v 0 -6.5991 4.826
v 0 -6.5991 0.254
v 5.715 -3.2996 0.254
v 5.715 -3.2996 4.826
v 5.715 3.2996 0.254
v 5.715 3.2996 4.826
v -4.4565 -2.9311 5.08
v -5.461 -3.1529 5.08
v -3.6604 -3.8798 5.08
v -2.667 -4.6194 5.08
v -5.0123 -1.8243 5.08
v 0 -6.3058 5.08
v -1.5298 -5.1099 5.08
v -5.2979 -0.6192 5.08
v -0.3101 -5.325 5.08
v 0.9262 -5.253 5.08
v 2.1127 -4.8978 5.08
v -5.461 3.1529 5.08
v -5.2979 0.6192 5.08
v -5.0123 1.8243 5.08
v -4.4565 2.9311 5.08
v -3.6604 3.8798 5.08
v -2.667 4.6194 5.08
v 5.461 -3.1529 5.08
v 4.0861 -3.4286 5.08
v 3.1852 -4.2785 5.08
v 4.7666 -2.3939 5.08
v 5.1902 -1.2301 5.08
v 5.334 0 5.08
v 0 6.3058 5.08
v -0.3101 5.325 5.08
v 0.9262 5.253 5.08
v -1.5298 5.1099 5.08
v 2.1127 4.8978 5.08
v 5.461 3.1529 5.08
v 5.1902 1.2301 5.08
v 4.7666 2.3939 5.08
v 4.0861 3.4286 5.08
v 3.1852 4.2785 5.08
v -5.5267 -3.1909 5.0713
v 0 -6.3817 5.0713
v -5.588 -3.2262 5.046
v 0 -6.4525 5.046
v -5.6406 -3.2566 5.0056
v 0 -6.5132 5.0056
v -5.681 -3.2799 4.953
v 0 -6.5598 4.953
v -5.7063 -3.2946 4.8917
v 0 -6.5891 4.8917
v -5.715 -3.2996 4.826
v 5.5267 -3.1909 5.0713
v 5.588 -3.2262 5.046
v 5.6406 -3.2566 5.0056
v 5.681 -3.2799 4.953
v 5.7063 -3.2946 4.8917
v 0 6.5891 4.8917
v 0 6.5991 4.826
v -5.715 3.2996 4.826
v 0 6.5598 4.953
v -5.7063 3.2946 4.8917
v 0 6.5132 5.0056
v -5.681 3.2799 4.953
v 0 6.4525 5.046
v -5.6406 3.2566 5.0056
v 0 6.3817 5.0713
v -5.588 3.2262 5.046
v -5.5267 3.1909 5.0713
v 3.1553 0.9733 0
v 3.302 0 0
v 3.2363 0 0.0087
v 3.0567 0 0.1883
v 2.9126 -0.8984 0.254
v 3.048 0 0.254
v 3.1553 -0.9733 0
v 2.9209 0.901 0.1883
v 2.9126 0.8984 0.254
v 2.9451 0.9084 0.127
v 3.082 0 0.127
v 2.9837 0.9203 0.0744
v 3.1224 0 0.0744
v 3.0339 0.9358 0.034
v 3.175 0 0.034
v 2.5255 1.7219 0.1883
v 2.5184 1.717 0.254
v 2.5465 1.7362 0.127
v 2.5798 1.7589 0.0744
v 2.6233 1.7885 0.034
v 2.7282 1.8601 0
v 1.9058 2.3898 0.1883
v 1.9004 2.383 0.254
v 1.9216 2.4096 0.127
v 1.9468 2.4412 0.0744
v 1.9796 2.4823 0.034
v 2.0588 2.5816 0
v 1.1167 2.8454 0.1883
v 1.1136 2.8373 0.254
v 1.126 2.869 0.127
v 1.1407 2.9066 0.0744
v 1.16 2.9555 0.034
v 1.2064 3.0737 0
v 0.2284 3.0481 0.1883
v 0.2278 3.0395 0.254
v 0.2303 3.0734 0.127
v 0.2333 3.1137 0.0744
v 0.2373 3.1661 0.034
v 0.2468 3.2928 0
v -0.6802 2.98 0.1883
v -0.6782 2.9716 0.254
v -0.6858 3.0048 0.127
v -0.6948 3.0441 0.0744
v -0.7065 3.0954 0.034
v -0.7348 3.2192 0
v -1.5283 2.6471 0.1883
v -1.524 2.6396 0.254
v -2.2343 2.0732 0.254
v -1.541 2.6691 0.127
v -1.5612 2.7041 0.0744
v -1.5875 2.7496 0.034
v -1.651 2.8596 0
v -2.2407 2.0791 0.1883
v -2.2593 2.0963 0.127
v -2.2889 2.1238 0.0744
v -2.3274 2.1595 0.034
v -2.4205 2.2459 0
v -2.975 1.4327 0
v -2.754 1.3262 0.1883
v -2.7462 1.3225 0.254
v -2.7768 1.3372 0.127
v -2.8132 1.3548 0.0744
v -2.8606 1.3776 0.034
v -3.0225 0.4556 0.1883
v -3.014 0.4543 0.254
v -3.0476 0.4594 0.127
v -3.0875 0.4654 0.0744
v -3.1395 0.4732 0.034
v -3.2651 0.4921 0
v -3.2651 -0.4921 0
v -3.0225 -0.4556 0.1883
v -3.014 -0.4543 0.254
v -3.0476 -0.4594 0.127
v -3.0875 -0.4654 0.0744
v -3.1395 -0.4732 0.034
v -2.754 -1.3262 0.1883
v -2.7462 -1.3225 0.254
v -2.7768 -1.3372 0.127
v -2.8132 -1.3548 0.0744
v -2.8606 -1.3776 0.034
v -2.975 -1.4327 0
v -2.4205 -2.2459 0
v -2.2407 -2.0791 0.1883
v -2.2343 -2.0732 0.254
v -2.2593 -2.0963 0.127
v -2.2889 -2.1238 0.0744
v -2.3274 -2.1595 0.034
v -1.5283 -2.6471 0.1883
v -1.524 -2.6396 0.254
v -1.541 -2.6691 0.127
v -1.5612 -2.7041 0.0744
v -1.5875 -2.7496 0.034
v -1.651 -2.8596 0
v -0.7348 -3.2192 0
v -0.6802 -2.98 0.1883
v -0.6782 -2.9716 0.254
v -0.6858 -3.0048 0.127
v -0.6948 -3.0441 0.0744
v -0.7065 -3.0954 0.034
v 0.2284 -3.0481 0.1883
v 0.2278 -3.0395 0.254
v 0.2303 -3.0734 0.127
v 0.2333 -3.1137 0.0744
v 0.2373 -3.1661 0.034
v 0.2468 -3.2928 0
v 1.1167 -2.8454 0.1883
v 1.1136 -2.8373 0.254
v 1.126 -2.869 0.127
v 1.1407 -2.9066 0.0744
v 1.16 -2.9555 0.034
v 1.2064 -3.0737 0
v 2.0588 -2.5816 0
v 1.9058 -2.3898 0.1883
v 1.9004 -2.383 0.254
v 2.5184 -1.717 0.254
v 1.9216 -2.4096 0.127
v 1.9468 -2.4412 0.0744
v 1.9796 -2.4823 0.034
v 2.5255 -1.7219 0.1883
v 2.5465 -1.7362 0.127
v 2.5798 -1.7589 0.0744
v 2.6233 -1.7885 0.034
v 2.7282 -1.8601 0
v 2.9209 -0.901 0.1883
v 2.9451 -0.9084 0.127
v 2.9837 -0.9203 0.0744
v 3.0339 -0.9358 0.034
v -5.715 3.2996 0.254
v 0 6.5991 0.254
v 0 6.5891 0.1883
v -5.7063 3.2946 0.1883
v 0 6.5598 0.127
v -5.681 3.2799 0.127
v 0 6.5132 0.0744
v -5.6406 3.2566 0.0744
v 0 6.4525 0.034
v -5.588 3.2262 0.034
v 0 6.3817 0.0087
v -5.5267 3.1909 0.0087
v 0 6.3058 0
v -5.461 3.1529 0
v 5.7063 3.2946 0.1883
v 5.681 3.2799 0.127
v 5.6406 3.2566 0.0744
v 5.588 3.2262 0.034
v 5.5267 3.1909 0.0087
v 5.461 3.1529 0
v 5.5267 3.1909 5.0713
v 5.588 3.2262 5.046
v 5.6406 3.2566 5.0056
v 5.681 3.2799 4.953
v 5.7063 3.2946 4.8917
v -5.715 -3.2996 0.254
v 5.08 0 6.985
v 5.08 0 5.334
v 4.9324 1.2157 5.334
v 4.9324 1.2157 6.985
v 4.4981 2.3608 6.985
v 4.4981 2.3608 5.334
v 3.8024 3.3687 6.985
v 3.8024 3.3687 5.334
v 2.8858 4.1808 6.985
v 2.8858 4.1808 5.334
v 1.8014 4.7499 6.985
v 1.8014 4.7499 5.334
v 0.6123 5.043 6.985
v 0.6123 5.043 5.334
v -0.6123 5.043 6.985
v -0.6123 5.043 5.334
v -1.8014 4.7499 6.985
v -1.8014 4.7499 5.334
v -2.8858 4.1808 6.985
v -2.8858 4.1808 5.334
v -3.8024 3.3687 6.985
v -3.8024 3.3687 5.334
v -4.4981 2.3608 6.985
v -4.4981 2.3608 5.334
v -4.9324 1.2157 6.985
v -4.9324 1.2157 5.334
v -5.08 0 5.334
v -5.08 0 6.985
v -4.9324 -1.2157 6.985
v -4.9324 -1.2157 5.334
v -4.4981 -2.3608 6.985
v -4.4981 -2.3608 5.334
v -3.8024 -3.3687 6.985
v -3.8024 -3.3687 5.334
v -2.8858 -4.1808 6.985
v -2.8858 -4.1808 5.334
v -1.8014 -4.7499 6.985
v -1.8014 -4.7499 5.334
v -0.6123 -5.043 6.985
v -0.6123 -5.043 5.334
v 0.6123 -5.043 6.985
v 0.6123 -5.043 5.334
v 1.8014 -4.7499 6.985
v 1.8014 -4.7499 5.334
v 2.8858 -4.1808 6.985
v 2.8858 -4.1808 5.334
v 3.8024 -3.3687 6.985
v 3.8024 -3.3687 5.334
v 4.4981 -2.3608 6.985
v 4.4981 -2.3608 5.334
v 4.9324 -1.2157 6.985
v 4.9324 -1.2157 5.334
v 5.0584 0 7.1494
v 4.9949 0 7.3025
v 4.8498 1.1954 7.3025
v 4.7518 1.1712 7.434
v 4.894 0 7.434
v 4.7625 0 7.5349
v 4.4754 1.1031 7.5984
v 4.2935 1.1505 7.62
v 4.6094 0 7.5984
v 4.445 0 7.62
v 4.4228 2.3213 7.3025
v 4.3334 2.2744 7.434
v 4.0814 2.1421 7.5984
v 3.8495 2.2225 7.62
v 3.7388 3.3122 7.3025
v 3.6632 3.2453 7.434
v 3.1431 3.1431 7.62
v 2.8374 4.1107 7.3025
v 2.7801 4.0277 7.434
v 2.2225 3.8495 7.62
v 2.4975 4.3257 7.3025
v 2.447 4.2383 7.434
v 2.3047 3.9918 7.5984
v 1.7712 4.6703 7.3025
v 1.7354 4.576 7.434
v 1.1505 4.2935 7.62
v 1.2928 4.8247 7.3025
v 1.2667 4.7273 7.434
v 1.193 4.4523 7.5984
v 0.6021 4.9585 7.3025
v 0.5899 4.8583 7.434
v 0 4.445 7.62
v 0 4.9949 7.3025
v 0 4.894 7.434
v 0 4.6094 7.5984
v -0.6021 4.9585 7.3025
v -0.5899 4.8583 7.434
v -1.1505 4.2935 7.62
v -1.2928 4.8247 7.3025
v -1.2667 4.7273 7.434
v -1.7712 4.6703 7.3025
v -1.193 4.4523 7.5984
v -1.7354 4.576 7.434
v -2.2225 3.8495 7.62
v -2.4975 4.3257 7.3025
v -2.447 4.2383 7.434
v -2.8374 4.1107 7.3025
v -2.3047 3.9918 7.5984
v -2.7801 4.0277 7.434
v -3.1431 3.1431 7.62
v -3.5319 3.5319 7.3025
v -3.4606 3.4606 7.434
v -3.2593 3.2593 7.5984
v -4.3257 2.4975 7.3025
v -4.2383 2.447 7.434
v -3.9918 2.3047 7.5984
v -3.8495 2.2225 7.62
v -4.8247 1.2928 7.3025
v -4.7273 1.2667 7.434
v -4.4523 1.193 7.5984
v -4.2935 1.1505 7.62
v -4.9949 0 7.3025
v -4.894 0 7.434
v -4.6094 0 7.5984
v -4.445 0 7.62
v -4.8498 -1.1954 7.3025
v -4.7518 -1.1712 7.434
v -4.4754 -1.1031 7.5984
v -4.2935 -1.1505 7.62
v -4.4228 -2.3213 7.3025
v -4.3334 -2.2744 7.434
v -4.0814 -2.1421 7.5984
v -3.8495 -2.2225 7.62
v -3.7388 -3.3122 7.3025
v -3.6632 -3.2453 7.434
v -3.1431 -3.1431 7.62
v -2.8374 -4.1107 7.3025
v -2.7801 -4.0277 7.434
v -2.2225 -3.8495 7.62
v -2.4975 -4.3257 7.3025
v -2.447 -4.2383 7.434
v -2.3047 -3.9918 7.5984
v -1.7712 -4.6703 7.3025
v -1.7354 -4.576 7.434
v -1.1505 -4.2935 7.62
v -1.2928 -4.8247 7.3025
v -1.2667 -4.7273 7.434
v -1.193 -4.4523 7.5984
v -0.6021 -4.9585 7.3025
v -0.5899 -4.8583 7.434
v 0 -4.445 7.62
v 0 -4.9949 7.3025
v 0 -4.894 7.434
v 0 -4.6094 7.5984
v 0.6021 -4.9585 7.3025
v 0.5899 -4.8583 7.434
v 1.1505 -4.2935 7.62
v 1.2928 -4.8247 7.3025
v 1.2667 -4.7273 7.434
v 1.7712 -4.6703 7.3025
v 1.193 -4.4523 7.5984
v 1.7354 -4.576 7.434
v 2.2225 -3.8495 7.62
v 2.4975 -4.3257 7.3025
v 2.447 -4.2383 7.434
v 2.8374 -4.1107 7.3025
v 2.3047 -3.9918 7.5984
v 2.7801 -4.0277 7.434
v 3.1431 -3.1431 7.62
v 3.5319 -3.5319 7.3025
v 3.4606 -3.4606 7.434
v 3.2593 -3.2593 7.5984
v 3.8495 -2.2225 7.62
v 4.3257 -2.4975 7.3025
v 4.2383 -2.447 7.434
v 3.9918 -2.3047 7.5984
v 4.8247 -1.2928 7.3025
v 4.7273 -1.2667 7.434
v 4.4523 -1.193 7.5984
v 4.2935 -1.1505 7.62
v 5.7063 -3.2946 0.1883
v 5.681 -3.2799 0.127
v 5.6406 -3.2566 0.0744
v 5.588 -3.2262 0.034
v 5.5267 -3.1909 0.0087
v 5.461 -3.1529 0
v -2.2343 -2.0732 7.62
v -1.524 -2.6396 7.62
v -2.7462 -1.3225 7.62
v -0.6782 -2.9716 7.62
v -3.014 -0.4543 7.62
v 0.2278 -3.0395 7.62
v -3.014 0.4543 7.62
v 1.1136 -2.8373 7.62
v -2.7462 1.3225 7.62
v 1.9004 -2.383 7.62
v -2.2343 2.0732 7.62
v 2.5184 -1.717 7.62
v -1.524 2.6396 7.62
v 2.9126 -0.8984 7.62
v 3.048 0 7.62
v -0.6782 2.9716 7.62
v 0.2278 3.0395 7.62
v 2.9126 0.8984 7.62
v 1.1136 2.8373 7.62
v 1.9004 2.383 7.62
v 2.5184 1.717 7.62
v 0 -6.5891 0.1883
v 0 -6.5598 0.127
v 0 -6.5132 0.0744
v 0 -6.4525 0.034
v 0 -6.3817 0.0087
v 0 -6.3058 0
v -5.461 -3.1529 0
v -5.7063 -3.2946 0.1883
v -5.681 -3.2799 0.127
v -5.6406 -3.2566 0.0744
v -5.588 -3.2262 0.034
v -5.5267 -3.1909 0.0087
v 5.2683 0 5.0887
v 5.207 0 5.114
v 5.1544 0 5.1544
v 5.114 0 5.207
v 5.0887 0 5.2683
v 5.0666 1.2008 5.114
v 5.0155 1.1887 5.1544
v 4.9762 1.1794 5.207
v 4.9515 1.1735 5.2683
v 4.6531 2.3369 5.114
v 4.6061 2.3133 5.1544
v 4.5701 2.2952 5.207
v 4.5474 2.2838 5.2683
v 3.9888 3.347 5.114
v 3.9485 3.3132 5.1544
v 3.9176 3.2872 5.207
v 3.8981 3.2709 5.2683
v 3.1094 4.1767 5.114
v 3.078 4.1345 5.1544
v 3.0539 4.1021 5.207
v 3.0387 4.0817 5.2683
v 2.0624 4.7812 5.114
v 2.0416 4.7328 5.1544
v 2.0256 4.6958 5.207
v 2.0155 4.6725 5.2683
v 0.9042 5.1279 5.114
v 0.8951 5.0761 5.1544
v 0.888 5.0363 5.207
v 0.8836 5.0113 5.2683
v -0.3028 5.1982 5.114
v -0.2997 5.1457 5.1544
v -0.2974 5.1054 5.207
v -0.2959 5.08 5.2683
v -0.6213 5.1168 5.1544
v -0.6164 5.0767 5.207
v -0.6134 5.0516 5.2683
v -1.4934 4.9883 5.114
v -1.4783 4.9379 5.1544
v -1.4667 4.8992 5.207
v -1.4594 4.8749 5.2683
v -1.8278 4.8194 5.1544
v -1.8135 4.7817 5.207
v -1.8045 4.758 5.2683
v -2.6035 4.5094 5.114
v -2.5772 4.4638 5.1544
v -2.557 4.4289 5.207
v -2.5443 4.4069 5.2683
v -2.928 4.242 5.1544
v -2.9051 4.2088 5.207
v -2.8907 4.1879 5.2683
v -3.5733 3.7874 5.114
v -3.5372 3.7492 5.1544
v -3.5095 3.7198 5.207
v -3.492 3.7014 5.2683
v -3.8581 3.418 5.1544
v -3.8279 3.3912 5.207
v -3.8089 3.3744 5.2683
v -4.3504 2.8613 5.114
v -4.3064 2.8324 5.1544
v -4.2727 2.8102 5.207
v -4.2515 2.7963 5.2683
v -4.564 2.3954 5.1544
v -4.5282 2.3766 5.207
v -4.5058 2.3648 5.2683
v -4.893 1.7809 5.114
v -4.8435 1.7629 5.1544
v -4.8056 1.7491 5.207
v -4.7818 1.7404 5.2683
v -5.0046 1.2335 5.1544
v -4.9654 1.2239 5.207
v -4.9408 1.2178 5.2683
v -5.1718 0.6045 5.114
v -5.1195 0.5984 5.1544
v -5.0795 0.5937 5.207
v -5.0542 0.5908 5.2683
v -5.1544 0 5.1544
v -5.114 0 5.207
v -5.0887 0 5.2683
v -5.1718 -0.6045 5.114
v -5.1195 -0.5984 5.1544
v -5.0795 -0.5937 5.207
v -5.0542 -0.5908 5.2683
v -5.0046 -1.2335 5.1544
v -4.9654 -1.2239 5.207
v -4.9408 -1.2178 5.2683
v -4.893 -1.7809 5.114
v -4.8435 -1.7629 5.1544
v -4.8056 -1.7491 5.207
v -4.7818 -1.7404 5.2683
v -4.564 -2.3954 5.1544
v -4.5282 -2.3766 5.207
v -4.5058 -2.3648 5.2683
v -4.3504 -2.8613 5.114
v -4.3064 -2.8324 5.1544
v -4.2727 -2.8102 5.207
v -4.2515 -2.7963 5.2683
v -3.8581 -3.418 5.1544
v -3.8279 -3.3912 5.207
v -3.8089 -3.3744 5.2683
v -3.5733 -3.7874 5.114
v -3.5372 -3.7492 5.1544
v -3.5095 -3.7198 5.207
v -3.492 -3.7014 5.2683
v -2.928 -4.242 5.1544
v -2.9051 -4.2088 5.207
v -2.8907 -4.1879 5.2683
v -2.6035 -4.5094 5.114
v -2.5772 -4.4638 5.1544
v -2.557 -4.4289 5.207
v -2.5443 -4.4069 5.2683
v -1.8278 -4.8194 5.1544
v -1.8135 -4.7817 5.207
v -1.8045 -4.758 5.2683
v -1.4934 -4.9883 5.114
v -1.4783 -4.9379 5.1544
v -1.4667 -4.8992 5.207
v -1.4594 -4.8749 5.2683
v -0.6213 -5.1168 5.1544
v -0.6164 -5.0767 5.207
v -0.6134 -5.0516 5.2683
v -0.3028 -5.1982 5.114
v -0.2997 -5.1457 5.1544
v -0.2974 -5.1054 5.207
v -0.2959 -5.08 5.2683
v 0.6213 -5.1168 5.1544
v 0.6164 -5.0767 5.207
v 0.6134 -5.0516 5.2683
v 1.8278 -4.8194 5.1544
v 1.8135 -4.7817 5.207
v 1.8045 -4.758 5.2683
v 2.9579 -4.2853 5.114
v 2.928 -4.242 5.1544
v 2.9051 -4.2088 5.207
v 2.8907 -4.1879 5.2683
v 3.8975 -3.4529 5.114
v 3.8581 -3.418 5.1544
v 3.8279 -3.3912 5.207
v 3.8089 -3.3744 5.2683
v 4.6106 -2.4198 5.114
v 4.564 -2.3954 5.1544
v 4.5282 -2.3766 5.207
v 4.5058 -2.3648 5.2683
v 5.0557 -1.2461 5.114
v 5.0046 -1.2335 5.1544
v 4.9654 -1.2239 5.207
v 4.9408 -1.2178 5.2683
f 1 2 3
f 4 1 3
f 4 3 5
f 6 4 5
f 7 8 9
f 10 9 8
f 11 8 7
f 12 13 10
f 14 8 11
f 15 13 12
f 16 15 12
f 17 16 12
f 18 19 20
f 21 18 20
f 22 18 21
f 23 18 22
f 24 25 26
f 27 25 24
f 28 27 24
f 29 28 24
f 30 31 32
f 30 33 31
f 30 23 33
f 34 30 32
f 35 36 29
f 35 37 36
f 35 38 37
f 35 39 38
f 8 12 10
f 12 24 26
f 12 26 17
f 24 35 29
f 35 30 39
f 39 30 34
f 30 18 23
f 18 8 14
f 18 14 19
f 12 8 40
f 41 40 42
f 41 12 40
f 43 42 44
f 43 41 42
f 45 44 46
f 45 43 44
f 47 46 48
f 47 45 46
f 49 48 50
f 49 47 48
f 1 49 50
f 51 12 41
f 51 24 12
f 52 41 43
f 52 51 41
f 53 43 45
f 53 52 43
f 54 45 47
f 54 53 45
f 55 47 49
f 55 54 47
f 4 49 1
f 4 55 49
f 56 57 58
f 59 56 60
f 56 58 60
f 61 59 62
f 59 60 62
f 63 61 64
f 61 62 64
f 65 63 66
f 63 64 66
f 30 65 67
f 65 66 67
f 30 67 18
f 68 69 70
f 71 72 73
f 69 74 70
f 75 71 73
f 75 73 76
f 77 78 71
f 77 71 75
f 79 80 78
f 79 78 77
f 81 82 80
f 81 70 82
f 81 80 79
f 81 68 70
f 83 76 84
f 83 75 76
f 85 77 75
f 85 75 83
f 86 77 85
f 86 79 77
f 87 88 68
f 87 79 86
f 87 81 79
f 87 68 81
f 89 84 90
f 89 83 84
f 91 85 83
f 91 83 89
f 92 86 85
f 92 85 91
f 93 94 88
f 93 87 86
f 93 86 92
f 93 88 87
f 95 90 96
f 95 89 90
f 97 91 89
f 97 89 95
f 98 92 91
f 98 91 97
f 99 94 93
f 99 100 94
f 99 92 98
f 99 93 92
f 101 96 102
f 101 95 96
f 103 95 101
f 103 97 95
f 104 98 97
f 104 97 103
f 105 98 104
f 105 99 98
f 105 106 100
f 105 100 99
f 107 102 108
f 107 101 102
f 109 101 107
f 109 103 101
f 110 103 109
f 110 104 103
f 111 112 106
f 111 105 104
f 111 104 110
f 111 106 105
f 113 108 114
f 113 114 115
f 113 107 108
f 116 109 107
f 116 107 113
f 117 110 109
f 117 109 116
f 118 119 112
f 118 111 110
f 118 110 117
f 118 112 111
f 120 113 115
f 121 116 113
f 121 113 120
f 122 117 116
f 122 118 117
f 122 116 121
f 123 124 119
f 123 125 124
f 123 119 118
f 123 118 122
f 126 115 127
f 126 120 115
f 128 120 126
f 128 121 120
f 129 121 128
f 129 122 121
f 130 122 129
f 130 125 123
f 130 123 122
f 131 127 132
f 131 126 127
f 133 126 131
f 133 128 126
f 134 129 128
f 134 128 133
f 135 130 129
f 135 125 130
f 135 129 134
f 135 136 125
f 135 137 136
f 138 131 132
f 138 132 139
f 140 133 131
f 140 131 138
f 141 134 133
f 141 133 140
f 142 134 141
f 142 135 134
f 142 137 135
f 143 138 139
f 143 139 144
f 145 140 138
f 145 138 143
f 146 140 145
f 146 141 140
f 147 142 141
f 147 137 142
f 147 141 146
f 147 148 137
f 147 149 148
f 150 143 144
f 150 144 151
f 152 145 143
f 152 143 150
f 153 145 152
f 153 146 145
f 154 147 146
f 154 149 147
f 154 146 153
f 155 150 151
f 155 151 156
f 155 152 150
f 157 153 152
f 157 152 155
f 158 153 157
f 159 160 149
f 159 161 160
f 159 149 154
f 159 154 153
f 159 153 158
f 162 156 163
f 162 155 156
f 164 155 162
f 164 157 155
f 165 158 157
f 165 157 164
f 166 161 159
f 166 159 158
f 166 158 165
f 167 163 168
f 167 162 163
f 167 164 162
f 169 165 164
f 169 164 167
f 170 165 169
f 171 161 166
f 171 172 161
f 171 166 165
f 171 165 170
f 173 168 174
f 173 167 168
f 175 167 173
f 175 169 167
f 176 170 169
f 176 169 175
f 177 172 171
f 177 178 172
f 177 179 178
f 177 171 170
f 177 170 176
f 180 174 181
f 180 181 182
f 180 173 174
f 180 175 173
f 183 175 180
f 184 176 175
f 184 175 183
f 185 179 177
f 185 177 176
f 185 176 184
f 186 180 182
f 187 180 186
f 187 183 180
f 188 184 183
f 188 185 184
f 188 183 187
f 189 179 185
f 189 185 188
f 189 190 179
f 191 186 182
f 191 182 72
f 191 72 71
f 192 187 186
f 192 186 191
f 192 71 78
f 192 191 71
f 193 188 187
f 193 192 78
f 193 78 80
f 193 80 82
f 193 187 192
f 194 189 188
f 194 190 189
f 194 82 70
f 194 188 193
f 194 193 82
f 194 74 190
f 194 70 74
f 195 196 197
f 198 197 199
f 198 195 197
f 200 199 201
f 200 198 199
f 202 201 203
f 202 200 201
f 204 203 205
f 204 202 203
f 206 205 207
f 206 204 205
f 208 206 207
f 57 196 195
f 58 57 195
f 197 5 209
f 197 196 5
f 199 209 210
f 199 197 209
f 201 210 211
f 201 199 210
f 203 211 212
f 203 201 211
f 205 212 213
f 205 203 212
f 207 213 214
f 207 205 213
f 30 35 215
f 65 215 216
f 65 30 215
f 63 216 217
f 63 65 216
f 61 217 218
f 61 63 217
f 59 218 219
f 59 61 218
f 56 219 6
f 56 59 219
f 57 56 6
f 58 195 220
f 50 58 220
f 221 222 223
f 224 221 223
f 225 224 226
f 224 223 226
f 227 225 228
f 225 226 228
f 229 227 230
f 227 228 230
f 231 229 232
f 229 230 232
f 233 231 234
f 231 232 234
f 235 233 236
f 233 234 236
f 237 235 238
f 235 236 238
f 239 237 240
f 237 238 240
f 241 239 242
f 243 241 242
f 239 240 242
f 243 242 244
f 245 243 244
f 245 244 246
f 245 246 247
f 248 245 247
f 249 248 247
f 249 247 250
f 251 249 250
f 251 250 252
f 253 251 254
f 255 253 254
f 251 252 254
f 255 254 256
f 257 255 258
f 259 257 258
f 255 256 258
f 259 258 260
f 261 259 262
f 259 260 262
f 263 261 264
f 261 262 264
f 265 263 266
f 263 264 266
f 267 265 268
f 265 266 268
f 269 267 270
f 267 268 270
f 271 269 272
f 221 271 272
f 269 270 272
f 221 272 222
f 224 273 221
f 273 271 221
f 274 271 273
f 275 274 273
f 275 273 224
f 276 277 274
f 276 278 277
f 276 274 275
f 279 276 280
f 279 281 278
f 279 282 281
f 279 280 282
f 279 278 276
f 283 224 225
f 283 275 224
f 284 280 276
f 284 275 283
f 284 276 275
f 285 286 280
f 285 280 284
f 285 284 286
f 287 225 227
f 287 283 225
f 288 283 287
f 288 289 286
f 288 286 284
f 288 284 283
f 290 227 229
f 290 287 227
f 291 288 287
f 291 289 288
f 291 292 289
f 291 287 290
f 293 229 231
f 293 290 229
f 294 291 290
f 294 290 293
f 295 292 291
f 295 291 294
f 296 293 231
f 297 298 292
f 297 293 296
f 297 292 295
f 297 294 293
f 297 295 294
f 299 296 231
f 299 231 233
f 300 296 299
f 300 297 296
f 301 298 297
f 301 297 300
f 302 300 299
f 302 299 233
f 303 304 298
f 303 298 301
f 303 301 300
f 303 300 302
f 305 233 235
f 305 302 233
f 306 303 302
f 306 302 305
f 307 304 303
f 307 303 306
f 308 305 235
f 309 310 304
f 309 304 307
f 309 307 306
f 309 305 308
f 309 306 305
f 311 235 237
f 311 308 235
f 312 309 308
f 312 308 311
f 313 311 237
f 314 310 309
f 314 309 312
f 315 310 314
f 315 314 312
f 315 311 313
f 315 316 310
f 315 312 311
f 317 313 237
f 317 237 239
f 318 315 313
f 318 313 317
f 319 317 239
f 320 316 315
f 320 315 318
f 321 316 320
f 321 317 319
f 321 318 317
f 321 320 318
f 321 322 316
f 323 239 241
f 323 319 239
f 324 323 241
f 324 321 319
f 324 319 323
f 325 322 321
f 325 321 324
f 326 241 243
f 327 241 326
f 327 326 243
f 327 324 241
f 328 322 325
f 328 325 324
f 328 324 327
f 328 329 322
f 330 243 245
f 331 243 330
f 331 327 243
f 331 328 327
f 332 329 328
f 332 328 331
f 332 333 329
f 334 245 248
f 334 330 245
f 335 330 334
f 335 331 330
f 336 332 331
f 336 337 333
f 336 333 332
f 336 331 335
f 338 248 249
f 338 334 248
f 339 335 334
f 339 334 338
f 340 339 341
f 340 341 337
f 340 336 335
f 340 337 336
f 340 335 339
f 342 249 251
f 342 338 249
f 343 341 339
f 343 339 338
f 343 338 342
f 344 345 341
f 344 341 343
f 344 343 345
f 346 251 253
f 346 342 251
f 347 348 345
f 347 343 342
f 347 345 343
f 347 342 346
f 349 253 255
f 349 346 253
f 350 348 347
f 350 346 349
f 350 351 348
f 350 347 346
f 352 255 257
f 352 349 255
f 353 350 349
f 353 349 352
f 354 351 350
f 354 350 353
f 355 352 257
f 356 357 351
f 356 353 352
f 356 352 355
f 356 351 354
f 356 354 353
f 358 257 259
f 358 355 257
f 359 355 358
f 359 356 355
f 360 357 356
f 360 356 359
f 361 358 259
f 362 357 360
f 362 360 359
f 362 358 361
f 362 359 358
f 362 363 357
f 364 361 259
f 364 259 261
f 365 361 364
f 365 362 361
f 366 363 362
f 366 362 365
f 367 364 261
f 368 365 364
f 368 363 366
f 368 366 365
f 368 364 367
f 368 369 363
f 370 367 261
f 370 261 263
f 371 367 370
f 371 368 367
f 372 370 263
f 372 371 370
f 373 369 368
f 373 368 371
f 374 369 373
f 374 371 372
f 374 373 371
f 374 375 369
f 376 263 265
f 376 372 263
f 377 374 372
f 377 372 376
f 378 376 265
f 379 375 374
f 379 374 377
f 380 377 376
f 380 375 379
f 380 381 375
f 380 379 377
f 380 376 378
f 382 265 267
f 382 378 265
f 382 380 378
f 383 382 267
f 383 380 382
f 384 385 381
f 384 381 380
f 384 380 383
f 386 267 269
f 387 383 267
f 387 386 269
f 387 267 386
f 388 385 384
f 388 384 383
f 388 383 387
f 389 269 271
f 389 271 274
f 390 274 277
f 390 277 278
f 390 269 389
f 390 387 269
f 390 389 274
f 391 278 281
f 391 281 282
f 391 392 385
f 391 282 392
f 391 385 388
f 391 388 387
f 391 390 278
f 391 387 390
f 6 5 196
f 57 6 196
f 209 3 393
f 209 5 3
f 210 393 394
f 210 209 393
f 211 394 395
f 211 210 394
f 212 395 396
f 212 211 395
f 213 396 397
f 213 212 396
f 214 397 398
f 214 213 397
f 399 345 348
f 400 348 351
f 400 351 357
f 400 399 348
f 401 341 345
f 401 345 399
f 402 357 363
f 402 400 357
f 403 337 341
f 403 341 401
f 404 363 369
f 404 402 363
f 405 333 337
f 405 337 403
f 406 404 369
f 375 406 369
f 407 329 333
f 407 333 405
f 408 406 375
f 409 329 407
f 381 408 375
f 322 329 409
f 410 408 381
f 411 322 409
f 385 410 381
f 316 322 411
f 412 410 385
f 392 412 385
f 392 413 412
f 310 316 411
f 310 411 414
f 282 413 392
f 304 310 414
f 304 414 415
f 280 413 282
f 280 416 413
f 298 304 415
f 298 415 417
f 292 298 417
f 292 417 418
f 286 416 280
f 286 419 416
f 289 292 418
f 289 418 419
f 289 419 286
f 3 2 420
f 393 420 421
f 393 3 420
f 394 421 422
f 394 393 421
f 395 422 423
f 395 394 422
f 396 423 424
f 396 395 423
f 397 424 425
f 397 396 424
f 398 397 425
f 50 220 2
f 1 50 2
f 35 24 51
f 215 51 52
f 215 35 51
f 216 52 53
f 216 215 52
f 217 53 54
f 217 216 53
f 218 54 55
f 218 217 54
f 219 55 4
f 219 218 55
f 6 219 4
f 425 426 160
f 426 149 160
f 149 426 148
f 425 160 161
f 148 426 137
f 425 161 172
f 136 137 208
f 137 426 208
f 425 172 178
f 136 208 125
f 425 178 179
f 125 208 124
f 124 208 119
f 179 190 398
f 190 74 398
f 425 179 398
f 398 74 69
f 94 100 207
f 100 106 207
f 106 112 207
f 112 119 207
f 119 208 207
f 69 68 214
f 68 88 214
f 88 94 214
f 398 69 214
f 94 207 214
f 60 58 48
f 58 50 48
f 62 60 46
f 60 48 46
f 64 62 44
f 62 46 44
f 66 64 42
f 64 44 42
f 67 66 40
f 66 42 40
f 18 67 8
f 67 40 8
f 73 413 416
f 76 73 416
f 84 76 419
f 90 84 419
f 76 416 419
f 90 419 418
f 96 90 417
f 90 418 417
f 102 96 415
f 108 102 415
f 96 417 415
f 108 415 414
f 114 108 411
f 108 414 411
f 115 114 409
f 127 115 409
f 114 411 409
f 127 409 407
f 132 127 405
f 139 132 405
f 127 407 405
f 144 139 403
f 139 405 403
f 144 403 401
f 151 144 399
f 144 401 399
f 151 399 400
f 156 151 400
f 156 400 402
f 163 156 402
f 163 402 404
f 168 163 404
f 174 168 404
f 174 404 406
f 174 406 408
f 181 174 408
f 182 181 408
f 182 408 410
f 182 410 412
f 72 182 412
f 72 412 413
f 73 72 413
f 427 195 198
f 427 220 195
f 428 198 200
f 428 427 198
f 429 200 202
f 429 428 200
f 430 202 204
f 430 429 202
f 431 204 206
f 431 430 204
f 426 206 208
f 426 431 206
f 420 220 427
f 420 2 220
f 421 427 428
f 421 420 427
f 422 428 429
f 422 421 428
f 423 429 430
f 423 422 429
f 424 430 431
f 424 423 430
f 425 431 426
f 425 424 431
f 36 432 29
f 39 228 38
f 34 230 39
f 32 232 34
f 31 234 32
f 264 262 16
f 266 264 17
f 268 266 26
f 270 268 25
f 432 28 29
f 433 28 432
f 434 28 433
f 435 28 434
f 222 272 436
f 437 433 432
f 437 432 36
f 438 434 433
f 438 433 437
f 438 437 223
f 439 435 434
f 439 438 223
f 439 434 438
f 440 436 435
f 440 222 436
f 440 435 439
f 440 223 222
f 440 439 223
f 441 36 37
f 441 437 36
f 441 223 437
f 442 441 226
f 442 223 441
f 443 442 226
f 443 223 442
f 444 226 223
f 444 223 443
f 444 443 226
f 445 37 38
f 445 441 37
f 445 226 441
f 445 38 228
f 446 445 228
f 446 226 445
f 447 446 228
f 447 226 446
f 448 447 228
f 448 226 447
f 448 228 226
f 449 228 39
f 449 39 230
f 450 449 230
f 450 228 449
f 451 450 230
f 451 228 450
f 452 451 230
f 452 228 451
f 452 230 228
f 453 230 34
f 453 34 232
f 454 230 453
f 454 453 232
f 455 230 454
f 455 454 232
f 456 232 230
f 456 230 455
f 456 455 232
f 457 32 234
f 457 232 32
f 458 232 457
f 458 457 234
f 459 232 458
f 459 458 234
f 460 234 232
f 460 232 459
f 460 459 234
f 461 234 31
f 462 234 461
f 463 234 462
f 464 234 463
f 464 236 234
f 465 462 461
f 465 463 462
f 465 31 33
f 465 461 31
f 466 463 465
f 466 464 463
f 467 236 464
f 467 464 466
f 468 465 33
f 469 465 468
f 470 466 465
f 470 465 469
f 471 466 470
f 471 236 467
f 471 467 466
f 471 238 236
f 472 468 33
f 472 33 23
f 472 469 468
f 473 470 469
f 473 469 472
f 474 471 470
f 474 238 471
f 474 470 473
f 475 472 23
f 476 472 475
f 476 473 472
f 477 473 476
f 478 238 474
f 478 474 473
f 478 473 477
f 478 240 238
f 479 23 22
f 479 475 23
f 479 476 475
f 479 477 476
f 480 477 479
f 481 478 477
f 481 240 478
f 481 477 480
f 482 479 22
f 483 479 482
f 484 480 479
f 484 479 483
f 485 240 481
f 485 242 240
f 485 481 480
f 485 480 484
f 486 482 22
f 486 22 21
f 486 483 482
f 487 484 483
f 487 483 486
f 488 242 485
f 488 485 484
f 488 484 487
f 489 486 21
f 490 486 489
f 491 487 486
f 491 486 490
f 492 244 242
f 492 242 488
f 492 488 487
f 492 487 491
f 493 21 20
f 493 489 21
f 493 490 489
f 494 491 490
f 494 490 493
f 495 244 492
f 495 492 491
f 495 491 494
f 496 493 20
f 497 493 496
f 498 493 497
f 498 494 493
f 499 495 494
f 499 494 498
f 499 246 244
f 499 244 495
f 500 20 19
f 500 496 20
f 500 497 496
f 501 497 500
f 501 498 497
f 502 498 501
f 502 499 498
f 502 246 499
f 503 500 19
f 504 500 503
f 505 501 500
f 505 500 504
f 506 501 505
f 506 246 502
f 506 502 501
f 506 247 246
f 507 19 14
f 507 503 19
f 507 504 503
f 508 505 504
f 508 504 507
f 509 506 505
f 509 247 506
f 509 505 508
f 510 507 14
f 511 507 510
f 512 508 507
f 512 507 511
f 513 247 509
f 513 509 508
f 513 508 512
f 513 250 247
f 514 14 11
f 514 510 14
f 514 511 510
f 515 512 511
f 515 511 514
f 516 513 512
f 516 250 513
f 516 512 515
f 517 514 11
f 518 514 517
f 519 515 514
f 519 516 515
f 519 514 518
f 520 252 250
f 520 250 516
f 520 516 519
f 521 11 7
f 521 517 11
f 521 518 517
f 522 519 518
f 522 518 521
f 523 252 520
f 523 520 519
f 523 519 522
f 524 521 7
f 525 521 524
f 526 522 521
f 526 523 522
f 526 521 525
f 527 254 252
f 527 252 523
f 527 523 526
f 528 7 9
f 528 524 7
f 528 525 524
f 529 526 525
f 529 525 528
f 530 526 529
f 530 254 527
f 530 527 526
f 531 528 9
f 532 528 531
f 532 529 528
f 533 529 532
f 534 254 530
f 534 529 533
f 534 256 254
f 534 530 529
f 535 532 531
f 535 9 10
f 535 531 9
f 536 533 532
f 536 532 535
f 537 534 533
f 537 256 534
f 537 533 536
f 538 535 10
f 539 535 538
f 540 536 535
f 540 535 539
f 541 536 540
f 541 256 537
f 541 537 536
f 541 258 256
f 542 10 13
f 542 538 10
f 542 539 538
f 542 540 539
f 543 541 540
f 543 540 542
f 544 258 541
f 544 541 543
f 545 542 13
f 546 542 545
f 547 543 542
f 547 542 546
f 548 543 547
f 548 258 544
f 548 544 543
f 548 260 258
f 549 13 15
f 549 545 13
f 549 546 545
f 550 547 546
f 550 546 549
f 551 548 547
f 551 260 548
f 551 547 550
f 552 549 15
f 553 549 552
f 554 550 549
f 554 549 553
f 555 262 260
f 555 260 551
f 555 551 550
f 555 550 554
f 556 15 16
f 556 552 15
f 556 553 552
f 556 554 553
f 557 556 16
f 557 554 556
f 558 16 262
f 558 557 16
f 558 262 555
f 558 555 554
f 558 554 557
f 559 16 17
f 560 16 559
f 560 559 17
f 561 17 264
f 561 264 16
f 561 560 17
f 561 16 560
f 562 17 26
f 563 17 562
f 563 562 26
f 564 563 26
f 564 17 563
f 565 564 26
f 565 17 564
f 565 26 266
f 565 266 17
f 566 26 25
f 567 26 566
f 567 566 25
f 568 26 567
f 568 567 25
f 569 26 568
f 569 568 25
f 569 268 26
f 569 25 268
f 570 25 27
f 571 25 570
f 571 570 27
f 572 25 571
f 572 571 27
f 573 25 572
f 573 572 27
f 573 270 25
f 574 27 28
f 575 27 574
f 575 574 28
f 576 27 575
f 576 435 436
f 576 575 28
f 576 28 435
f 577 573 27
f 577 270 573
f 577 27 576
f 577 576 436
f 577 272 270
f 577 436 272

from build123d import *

# Parameters (mm, degrees)
BOSS_EXTRUDE1_DEPTH = 5.08
SKETCH3_R           = 5.08
BOSS_EXTRUDE3_DEPTH = 2.54
FILLET1_R           = 0.635
SKETCH4_R           = 3.048
CUT_EXTRUDE1_DEPTH  = 12.58766262
FILLET2_R           = 0.254
FILLET3_R           = 0.254


with BuildPart() as part:
    # Sketch1 → Boss-Extrude1 (new body)
    with BuildSketch(Plane.XY):
        Polygon((-5.715, 3.299556788), (-5.715, -3.299556788), (0, -6.599113577), (5.715, -3.299556788), (5.715, 3.299556788), (0, 6.599113577), align=None)
    extrude(amount=BOSS_EXTRUDE1_DEPTH)

    # Sketch3 → Boss-Extrude3 (add)
    with BuildSketch(Plane.XY.offset(5.08)):
        Circle(SKETCH3_R)
    extrude(amount=BOSS_EXTRUDE3_DEPTH)

    # Fillet1
    fillet1_edges = [part.edges().sort_by_distance(p)[0] for p in [
        (-5.08, 0, 7.62),
    ]]
    fillet(fillet1_edges, radius=FILLET1_R)

    # Sketch4 → Cut-Extrude1 (cut, through all)
    with BuildSketch(Plane.XY.offset(7.62)):
        Circle(SKETCH4_R)
    extrude(amount=-CUT_EXTRUDE1_DEPTH, mode=Mode.SUBTRACT)

    # Fillet2
    fillet2_edges = [part.edges().sort_by_distance(p)[0] for p in [
        (-3.048, 0, 0),
        (2.8575, 4.949335183, 0),
        (5.715, 0, 0),
        (2.8575, -4.949335183, 0),
        (-2.8575, -4.949335183, 0),
        (-5.715, 0, 0),
        (-2.8575, 4.949335183, 0),
    ]]
    fillet(fillet2_edges, radius=FILLET2_R)

    # Fillet3
    fillet3_edges = [part.edges().sort_by_distance(p)[0] for p in [
        (-2.8575, -4.949335183, 5.08),
        (2.8575, -4.949335183, 5.08),
        (5.715, 0, 5.08),
        (-5.08, 0, 5.08),
        (2.8575, 4.949335183, 5.08),
        (-2.8575, 4.949335183, 5.08),
        (-5.715, 0, 5.08),
    ]]
    fillet(fillet3_edges, radius=FILLET3_R)


solid = part.part
